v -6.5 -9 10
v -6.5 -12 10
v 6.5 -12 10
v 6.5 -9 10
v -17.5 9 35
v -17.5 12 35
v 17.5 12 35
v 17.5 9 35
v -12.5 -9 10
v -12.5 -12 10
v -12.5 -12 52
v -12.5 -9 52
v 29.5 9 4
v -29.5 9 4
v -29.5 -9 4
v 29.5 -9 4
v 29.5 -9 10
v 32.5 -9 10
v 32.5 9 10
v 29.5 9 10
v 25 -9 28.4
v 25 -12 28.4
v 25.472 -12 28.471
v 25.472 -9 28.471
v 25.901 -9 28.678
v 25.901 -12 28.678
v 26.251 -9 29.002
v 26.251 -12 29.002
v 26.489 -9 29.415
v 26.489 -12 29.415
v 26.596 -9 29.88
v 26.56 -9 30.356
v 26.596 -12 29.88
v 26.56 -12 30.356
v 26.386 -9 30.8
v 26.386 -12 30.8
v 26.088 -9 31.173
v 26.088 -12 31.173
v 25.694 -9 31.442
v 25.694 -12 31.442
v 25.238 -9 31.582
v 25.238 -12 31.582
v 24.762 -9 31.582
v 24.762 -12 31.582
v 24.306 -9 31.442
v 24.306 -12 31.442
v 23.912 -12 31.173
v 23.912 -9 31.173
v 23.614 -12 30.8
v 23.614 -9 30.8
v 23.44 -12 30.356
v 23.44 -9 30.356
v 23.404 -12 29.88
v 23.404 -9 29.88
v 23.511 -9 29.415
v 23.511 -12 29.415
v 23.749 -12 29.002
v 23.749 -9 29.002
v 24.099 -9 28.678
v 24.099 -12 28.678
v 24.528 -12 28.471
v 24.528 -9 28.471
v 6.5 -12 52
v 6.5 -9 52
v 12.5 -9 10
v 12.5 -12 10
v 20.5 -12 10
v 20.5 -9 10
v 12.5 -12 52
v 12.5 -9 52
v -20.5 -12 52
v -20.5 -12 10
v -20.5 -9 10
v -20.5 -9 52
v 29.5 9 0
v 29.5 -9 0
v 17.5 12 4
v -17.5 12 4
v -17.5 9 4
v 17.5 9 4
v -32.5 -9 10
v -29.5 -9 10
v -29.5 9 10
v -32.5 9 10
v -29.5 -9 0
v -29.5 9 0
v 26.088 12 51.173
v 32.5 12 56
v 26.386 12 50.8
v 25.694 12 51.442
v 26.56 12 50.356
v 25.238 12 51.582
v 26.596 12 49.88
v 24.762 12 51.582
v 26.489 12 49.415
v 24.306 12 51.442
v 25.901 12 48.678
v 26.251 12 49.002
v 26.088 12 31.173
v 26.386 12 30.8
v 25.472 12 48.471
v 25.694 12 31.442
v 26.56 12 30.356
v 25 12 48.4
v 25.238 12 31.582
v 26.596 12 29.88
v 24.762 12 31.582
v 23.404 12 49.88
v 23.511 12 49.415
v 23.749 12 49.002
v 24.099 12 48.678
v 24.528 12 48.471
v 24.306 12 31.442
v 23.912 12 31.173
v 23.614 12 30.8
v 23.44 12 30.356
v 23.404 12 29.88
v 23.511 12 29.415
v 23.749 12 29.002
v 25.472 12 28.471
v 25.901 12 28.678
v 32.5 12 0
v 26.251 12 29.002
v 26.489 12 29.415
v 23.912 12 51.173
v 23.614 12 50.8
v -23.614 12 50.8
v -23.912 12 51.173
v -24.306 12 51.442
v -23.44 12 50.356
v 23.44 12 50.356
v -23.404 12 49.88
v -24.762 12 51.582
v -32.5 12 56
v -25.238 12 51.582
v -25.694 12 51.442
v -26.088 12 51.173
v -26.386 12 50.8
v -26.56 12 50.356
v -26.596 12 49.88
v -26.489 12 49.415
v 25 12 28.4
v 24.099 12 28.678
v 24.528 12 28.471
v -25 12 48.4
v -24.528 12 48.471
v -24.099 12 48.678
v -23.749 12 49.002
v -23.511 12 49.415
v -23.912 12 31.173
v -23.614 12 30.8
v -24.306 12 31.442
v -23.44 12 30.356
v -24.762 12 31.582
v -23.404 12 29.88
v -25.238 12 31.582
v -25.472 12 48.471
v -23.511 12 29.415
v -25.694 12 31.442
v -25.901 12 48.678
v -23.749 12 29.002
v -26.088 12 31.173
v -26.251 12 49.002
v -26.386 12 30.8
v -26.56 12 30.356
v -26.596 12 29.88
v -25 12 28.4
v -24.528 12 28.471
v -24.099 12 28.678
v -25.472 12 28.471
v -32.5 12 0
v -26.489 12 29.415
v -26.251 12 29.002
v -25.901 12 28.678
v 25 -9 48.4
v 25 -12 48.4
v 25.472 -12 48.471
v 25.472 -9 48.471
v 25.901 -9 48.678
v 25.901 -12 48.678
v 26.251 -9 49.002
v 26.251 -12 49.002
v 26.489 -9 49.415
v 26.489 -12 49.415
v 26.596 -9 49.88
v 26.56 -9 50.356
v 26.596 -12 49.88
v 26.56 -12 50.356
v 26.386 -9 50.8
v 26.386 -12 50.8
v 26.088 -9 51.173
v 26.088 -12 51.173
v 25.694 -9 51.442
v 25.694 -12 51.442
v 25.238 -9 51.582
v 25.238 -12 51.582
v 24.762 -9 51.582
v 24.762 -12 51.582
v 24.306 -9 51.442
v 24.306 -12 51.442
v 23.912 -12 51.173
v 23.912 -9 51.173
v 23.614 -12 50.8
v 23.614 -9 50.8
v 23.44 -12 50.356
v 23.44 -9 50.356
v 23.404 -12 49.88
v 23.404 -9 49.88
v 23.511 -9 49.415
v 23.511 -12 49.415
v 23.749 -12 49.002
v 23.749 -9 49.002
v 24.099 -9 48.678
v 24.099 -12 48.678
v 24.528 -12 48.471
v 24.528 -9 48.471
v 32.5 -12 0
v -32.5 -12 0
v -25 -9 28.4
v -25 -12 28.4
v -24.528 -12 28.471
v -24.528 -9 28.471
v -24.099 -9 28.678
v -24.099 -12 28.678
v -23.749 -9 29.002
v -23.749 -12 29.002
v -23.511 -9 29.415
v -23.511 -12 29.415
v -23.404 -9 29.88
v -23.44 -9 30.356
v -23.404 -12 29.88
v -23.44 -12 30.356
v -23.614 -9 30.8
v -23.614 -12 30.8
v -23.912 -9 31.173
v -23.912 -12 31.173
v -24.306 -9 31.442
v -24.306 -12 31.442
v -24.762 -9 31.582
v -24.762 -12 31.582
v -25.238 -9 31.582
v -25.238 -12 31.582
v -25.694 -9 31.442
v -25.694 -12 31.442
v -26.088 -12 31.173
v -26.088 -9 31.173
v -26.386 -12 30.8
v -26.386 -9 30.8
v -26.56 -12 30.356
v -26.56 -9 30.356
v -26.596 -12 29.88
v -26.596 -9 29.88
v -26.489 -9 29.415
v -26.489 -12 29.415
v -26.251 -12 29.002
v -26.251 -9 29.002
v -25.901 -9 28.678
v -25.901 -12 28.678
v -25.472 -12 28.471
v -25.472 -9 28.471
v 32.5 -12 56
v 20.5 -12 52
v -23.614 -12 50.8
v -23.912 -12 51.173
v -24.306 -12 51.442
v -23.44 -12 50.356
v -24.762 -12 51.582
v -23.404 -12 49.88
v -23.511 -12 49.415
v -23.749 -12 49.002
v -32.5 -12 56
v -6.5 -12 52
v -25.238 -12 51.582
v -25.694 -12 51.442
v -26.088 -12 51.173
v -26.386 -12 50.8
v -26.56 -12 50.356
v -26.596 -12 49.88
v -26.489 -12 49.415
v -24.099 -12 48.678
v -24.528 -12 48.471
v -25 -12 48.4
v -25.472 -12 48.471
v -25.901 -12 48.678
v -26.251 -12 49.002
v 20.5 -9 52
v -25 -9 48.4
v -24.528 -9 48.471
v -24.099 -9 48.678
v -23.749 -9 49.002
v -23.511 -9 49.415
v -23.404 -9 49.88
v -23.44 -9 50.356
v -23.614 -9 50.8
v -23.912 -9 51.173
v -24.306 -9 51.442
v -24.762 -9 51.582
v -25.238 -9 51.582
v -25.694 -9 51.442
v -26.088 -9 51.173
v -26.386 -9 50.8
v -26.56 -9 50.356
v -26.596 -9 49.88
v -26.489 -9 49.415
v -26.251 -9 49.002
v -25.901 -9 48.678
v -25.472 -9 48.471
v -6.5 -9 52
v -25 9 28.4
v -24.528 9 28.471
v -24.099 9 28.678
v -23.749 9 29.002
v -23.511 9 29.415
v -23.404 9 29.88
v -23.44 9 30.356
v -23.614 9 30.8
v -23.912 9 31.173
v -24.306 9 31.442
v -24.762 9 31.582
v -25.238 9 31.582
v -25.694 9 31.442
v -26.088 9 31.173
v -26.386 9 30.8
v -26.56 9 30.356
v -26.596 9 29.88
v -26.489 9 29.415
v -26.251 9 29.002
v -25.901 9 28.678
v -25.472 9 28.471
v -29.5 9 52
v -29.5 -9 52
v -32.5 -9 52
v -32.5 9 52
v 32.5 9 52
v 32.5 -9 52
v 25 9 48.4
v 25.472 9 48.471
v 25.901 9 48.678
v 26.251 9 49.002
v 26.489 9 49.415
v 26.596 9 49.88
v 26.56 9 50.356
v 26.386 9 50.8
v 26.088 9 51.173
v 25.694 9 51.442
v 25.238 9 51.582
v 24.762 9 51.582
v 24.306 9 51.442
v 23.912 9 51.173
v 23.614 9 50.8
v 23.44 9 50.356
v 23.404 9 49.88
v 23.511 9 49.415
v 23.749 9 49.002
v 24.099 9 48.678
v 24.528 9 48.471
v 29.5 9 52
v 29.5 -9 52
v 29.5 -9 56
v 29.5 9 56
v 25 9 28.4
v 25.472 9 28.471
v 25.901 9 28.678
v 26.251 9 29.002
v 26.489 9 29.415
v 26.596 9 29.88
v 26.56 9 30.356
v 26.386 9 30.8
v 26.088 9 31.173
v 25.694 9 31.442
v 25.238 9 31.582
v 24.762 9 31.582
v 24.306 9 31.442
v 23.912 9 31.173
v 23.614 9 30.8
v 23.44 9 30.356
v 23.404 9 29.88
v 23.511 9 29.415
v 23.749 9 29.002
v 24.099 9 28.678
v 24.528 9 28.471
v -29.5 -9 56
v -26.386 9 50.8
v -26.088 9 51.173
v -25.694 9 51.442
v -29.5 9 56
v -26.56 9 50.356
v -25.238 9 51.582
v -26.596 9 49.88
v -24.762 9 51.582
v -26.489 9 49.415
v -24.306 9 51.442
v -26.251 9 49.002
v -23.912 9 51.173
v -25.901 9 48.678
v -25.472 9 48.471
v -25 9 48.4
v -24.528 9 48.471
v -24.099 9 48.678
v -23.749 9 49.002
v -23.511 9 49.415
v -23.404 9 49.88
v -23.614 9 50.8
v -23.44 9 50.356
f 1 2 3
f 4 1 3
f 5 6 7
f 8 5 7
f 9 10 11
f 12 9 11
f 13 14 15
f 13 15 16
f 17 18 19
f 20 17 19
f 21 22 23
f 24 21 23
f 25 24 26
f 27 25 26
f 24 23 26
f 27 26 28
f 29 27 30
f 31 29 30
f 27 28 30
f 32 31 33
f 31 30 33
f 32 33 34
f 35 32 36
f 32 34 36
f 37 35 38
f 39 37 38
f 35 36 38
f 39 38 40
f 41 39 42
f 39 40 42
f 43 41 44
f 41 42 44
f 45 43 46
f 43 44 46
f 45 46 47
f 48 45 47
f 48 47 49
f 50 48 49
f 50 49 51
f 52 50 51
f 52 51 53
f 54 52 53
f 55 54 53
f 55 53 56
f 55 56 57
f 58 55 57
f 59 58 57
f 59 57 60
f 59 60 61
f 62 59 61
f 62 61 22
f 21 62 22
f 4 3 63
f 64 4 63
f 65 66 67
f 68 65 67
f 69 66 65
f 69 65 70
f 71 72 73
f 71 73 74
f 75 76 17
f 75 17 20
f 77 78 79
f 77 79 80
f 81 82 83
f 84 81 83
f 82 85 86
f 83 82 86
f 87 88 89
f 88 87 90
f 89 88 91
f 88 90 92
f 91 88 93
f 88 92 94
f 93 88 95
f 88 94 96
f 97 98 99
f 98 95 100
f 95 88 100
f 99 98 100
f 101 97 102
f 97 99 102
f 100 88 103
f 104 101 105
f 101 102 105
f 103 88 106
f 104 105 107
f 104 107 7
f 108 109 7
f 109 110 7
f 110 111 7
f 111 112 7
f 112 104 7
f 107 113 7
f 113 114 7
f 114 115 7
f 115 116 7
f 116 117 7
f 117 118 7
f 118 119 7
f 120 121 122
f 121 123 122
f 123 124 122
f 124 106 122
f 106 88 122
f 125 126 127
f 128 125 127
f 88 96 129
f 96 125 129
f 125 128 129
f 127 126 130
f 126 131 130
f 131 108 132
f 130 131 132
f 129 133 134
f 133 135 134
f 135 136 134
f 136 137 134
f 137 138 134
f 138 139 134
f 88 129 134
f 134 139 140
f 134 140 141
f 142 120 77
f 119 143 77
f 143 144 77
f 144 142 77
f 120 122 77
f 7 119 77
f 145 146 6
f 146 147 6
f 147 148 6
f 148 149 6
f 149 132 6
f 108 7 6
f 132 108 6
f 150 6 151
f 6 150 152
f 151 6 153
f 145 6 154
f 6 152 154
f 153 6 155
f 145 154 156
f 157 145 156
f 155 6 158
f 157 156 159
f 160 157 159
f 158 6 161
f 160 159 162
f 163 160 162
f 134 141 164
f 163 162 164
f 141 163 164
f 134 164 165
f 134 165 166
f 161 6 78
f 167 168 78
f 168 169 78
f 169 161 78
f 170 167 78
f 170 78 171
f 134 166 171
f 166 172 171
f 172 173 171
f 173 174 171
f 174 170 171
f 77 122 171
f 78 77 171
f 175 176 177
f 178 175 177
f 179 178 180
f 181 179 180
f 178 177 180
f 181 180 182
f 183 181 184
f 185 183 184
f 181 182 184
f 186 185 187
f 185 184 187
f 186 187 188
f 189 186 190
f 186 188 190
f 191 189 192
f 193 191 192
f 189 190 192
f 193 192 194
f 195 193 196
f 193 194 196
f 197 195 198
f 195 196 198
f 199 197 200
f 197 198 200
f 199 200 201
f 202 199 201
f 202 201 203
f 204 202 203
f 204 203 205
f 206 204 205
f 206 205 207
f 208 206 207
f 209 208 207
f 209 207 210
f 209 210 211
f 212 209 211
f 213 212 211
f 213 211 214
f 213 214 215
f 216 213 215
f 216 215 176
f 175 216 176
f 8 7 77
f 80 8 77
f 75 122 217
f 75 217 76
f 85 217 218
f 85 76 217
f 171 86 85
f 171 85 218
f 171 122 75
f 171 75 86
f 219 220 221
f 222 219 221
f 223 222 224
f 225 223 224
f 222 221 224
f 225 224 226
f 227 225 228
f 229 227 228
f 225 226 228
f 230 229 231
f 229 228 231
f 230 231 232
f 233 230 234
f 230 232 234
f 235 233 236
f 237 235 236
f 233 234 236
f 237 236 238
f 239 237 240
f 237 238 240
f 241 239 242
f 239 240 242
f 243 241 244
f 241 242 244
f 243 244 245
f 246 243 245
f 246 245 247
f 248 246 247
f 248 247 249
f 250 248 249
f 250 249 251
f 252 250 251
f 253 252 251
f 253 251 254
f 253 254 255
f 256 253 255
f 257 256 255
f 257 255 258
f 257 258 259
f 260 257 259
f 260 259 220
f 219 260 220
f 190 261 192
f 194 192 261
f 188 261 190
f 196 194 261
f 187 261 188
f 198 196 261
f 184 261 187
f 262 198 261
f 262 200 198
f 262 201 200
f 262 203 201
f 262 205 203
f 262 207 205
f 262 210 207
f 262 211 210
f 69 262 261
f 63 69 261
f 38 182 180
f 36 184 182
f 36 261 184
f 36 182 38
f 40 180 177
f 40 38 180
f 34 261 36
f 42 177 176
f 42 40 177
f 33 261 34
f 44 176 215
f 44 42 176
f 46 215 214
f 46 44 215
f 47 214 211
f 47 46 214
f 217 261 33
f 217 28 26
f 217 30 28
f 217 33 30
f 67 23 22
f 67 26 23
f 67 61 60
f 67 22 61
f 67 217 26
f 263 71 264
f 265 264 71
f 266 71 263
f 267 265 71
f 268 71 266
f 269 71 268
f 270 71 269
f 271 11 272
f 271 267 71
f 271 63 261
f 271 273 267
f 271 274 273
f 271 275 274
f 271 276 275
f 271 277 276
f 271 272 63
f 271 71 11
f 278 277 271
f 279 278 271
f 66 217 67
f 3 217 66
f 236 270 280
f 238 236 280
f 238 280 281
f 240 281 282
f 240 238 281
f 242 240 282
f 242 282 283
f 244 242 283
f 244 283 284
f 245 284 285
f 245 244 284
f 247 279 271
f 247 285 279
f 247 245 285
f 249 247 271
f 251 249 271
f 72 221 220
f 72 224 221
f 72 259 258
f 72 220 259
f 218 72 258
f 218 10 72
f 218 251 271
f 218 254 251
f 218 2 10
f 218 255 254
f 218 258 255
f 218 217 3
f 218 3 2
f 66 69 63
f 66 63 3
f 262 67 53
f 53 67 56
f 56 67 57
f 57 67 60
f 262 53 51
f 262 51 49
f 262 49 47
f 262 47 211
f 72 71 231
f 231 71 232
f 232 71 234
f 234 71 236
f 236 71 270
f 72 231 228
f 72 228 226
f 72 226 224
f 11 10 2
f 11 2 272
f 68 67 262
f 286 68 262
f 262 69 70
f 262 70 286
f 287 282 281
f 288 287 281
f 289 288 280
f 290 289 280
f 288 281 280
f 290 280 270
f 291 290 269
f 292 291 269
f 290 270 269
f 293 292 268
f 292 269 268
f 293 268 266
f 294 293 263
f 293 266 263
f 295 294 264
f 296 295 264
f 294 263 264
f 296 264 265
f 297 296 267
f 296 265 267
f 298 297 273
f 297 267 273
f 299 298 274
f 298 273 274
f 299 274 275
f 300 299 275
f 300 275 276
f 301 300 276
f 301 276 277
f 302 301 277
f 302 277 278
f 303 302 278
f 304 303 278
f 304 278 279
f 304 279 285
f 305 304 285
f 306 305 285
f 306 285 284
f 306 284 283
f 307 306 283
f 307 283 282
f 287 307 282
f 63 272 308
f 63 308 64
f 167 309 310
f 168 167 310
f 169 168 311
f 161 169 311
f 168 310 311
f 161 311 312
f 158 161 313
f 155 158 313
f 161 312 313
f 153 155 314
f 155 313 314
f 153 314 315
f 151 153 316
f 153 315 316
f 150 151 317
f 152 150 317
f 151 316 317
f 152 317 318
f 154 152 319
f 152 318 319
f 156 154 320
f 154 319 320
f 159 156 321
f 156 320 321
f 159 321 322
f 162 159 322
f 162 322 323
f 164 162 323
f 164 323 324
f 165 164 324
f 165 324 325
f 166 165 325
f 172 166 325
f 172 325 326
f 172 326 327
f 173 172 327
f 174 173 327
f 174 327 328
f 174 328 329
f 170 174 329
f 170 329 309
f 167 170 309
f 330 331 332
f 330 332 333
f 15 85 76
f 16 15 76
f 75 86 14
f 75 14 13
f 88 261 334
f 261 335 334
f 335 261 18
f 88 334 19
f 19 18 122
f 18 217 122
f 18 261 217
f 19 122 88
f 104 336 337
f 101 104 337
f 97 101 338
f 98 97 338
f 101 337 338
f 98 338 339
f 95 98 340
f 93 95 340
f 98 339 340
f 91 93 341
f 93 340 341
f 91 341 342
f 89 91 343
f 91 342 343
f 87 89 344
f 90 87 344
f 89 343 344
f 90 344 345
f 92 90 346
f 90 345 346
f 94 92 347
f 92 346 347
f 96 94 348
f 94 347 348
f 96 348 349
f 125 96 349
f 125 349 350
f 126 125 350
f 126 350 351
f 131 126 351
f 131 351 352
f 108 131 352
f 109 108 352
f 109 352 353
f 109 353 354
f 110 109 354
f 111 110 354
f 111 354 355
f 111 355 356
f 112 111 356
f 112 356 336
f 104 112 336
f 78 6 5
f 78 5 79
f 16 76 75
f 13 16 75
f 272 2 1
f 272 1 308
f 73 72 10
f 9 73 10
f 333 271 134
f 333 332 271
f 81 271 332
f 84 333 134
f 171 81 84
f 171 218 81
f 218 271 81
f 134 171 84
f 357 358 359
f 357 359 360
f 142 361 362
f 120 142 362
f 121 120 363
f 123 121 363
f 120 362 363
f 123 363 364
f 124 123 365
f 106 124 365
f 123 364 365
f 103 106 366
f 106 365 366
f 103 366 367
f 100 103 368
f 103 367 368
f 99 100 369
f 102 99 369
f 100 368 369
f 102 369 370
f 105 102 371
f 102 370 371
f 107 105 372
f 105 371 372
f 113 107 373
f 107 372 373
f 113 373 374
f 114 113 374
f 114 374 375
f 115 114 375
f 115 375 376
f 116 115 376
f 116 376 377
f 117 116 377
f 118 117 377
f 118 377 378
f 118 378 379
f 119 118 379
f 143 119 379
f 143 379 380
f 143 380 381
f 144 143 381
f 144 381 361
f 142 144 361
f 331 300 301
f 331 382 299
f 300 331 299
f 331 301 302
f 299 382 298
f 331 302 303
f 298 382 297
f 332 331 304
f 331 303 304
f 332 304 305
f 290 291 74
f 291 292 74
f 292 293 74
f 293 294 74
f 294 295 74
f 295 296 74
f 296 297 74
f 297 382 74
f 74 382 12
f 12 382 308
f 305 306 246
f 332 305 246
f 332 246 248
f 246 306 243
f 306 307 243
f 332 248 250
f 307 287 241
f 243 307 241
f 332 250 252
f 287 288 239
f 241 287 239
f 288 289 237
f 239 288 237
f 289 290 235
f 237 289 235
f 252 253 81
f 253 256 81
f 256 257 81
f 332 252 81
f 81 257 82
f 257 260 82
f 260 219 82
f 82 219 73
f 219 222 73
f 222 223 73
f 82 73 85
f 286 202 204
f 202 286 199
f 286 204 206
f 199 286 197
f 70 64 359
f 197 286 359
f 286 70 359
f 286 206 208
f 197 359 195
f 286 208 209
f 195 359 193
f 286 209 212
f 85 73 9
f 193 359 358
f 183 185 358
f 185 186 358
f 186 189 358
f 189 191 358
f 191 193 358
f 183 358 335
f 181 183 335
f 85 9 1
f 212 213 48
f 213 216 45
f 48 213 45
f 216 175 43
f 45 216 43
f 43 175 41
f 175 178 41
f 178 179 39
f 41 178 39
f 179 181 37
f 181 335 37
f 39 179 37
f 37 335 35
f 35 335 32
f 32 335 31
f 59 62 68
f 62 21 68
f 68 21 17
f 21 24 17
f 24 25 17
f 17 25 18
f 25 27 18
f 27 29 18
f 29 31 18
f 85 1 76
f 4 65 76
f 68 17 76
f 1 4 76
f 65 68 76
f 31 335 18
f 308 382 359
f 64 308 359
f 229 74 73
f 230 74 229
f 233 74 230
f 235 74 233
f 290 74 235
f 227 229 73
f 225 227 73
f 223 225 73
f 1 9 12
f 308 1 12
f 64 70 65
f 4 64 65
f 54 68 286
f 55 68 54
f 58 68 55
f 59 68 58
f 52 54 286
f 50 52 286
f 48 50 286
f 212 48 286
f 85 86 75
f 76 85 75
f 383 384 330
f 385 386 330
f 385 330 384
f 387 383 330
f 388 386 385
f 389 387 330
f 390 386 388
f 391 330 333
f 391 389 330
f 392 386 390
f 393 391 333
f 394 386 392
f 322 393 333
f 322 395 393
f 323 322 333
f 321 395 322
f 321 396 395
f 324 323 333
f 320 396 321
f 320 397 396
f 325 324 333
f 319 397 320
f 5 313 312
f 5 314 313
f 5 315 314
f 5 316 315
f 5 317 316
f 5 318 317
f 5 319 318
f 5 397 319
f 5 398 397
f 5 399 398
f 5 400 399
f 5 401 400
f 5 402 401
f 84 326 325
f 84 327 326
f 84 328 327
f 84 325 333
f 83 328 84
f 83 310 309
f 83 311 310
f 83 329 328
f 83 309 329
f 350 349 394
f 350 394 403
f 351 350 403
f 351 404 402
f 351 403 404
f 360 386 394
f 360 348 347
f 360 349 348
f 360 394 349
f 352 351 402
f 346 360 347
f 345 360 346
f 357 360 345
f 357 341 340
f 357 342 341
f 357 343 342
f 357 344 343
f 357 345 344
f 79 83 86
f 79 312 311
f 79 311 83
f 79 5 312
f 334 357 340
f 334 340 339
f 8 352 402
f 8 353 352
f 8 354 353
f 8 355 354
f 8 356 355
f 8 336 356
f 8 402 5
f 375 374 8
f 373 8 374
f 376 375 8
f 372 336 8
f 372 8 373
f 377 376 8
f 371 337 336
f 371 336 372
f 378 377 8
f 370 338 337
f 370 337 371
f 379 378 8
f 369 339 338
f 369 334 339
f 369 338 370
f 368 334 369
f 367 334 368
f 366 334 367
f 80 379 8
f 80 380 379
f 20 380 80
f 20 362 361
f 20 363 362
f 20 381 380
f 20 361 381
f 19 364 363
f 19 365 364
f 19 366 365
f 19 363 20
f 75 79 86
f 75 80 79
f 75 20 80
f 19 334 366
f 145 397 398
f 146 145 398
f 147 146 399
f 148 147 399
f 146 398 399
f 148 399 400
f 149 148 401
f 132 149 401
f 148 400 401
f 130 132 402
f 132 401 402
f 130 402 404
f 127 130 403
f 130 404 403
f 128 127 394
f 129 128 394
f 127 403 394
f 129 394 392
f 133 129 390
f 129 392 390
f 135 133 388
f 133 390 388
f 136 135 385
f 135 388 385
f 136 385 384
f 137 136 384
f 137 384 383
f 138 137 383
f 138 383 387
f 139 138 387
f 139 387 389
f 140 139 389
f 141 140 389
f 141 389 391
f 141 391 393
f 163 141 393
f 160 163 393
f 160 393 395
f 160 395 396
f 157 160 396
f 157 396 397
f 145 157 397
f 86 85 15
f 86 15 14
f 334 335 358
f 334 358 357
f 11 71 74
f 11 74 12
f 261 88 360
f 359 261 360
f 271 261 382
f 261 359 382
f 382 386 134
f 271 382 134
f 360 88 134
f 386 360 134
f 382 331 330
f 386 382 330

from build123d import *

# Parameters (mm, degrees)
SKETCH_1_W          = 59
SKETCH_1_H          = 18
EXTRUDE_1_DEPTH     = 4
SKETCH_2_W          = 65
SKETCH_2_H          = 24
SKETCH_2_W_2        = 59
SKETCH_2_H_2        = 18
EXTRUDE_3_DEPTH     = 56
SKETCH_3_W          = 35
SKETCH_3_H          = 31
CUT_EXTRUDE_1_DEPTH = 3
SKETCH_4_R          = 1.6
CUT_EXTRUDE_2_DEPTH = 70.052516247
SKETCH_5_W          = 42
SKETCH_5_H          = 18
CUT_EXTRUDE_3_DEPTH = 87.631403082
SKETCH_6_W          = 13
SKETCH_6_H          = 42
SKETCH_6_W_2        = 8
CUT_EXTRUDE_4_DEPTH = 3


with BuildPart() as part:
    # 草图1 → 凸台-拉伸1 (new body)
    with BuildSketch(Plane.XY):
        Rectangle(SKETCH_1_W, SKETCH_1_H)
    extrude(amount=EXTRUDE_1_DEPTH)


with BuildPart() as body_2:
    # 草图2 → 凸台-拉伸3 (new body)
    with BuildSketch(Plane(origin=(0, 0, 0), x_dir=(-1, 0, 0), z_dir=(0, 0, -1))):
        Rectangle(SKETCH_2_W, SKETCH_2_H)
        Rectangle(SKETCH_2_W_2, SKETCH_2_H_2, mode=Mode.SUBTRACT)
    extrude(amount=-EXTRUDE_3_DEPTH)

    # 草图3 → 切除-拉伸1 (cut)
    with BuildSketch(Plane(origin=(0, 12, 0), x_dir=(1, 0, 0), z_dir=(0, 1, 0))):
        with Locations((0, -19.5)):
            Rectangle(SKETCH_3_W, SKETCH_3_H)
    extrude(amount=-CUT_EXTRUDE_1_DEPTH, mode=Mode.SUBTRACT)

    # 草图4 → 切除-拉伸2 (cut, through all)
    with BuildSketch(Plane.XZ.offset(12)):
        with Locations(Location((25, 50, 0), (0, 0, 270))):
            Circle(SKETCH_4_R)
        with Locations(Location((25, 30, 0), (0, 0, 270))):
            Circle(SKETCH_4_R)
        with Locations(Location((-25, 30, 0), (0, 0, 270))):
            Circle(SKETCH_4_R)
        with Locations(Location((-25, 50, 0), (0, 0, 270))):
            Circle(SKETCH_4_R)
    extrude(amount=-CUT_EXTRUDE_2_DEPTH, mode=Mode.SUBTRACT)

    # 草图5 → 切除-拉伸3 (cut, through all)
    with BuildSketch(Plane(origin=(32.5, 0, 0), x_dir=(0, 0, -1), z_dir=(1, 0, 0))):
        with Locations((-31, 0)):
            Rectangle(SKETCH_5_W, SKETCH_5_H)
    extrude(amount=-CUT_EXTRUDE_3_DEPTH, mode=Mode.SUBTRACT)

    # 草图6 → 切除-拉伸4 (cut)
    with BuildSketch(Plane.XZ.offset(12)):
        with Locations((0, 31)):
            Rectangle(SKETCH_6_W, SKETCH_6_H)
        with Locations((16.5, 31)):
            Rectangle(SKETCH_6_W_2, SKETCH_6_H)
        with Locations((-16.5, 31)):
            Rectangle(SKETCH_6_W_2, SKETCH_6_H)
    extrude(amount=-CUT_EXTRUDE_4_DEPTH, mode=Mode.SUBTRACT)


solid = Compound([part.part, body_2.part])
